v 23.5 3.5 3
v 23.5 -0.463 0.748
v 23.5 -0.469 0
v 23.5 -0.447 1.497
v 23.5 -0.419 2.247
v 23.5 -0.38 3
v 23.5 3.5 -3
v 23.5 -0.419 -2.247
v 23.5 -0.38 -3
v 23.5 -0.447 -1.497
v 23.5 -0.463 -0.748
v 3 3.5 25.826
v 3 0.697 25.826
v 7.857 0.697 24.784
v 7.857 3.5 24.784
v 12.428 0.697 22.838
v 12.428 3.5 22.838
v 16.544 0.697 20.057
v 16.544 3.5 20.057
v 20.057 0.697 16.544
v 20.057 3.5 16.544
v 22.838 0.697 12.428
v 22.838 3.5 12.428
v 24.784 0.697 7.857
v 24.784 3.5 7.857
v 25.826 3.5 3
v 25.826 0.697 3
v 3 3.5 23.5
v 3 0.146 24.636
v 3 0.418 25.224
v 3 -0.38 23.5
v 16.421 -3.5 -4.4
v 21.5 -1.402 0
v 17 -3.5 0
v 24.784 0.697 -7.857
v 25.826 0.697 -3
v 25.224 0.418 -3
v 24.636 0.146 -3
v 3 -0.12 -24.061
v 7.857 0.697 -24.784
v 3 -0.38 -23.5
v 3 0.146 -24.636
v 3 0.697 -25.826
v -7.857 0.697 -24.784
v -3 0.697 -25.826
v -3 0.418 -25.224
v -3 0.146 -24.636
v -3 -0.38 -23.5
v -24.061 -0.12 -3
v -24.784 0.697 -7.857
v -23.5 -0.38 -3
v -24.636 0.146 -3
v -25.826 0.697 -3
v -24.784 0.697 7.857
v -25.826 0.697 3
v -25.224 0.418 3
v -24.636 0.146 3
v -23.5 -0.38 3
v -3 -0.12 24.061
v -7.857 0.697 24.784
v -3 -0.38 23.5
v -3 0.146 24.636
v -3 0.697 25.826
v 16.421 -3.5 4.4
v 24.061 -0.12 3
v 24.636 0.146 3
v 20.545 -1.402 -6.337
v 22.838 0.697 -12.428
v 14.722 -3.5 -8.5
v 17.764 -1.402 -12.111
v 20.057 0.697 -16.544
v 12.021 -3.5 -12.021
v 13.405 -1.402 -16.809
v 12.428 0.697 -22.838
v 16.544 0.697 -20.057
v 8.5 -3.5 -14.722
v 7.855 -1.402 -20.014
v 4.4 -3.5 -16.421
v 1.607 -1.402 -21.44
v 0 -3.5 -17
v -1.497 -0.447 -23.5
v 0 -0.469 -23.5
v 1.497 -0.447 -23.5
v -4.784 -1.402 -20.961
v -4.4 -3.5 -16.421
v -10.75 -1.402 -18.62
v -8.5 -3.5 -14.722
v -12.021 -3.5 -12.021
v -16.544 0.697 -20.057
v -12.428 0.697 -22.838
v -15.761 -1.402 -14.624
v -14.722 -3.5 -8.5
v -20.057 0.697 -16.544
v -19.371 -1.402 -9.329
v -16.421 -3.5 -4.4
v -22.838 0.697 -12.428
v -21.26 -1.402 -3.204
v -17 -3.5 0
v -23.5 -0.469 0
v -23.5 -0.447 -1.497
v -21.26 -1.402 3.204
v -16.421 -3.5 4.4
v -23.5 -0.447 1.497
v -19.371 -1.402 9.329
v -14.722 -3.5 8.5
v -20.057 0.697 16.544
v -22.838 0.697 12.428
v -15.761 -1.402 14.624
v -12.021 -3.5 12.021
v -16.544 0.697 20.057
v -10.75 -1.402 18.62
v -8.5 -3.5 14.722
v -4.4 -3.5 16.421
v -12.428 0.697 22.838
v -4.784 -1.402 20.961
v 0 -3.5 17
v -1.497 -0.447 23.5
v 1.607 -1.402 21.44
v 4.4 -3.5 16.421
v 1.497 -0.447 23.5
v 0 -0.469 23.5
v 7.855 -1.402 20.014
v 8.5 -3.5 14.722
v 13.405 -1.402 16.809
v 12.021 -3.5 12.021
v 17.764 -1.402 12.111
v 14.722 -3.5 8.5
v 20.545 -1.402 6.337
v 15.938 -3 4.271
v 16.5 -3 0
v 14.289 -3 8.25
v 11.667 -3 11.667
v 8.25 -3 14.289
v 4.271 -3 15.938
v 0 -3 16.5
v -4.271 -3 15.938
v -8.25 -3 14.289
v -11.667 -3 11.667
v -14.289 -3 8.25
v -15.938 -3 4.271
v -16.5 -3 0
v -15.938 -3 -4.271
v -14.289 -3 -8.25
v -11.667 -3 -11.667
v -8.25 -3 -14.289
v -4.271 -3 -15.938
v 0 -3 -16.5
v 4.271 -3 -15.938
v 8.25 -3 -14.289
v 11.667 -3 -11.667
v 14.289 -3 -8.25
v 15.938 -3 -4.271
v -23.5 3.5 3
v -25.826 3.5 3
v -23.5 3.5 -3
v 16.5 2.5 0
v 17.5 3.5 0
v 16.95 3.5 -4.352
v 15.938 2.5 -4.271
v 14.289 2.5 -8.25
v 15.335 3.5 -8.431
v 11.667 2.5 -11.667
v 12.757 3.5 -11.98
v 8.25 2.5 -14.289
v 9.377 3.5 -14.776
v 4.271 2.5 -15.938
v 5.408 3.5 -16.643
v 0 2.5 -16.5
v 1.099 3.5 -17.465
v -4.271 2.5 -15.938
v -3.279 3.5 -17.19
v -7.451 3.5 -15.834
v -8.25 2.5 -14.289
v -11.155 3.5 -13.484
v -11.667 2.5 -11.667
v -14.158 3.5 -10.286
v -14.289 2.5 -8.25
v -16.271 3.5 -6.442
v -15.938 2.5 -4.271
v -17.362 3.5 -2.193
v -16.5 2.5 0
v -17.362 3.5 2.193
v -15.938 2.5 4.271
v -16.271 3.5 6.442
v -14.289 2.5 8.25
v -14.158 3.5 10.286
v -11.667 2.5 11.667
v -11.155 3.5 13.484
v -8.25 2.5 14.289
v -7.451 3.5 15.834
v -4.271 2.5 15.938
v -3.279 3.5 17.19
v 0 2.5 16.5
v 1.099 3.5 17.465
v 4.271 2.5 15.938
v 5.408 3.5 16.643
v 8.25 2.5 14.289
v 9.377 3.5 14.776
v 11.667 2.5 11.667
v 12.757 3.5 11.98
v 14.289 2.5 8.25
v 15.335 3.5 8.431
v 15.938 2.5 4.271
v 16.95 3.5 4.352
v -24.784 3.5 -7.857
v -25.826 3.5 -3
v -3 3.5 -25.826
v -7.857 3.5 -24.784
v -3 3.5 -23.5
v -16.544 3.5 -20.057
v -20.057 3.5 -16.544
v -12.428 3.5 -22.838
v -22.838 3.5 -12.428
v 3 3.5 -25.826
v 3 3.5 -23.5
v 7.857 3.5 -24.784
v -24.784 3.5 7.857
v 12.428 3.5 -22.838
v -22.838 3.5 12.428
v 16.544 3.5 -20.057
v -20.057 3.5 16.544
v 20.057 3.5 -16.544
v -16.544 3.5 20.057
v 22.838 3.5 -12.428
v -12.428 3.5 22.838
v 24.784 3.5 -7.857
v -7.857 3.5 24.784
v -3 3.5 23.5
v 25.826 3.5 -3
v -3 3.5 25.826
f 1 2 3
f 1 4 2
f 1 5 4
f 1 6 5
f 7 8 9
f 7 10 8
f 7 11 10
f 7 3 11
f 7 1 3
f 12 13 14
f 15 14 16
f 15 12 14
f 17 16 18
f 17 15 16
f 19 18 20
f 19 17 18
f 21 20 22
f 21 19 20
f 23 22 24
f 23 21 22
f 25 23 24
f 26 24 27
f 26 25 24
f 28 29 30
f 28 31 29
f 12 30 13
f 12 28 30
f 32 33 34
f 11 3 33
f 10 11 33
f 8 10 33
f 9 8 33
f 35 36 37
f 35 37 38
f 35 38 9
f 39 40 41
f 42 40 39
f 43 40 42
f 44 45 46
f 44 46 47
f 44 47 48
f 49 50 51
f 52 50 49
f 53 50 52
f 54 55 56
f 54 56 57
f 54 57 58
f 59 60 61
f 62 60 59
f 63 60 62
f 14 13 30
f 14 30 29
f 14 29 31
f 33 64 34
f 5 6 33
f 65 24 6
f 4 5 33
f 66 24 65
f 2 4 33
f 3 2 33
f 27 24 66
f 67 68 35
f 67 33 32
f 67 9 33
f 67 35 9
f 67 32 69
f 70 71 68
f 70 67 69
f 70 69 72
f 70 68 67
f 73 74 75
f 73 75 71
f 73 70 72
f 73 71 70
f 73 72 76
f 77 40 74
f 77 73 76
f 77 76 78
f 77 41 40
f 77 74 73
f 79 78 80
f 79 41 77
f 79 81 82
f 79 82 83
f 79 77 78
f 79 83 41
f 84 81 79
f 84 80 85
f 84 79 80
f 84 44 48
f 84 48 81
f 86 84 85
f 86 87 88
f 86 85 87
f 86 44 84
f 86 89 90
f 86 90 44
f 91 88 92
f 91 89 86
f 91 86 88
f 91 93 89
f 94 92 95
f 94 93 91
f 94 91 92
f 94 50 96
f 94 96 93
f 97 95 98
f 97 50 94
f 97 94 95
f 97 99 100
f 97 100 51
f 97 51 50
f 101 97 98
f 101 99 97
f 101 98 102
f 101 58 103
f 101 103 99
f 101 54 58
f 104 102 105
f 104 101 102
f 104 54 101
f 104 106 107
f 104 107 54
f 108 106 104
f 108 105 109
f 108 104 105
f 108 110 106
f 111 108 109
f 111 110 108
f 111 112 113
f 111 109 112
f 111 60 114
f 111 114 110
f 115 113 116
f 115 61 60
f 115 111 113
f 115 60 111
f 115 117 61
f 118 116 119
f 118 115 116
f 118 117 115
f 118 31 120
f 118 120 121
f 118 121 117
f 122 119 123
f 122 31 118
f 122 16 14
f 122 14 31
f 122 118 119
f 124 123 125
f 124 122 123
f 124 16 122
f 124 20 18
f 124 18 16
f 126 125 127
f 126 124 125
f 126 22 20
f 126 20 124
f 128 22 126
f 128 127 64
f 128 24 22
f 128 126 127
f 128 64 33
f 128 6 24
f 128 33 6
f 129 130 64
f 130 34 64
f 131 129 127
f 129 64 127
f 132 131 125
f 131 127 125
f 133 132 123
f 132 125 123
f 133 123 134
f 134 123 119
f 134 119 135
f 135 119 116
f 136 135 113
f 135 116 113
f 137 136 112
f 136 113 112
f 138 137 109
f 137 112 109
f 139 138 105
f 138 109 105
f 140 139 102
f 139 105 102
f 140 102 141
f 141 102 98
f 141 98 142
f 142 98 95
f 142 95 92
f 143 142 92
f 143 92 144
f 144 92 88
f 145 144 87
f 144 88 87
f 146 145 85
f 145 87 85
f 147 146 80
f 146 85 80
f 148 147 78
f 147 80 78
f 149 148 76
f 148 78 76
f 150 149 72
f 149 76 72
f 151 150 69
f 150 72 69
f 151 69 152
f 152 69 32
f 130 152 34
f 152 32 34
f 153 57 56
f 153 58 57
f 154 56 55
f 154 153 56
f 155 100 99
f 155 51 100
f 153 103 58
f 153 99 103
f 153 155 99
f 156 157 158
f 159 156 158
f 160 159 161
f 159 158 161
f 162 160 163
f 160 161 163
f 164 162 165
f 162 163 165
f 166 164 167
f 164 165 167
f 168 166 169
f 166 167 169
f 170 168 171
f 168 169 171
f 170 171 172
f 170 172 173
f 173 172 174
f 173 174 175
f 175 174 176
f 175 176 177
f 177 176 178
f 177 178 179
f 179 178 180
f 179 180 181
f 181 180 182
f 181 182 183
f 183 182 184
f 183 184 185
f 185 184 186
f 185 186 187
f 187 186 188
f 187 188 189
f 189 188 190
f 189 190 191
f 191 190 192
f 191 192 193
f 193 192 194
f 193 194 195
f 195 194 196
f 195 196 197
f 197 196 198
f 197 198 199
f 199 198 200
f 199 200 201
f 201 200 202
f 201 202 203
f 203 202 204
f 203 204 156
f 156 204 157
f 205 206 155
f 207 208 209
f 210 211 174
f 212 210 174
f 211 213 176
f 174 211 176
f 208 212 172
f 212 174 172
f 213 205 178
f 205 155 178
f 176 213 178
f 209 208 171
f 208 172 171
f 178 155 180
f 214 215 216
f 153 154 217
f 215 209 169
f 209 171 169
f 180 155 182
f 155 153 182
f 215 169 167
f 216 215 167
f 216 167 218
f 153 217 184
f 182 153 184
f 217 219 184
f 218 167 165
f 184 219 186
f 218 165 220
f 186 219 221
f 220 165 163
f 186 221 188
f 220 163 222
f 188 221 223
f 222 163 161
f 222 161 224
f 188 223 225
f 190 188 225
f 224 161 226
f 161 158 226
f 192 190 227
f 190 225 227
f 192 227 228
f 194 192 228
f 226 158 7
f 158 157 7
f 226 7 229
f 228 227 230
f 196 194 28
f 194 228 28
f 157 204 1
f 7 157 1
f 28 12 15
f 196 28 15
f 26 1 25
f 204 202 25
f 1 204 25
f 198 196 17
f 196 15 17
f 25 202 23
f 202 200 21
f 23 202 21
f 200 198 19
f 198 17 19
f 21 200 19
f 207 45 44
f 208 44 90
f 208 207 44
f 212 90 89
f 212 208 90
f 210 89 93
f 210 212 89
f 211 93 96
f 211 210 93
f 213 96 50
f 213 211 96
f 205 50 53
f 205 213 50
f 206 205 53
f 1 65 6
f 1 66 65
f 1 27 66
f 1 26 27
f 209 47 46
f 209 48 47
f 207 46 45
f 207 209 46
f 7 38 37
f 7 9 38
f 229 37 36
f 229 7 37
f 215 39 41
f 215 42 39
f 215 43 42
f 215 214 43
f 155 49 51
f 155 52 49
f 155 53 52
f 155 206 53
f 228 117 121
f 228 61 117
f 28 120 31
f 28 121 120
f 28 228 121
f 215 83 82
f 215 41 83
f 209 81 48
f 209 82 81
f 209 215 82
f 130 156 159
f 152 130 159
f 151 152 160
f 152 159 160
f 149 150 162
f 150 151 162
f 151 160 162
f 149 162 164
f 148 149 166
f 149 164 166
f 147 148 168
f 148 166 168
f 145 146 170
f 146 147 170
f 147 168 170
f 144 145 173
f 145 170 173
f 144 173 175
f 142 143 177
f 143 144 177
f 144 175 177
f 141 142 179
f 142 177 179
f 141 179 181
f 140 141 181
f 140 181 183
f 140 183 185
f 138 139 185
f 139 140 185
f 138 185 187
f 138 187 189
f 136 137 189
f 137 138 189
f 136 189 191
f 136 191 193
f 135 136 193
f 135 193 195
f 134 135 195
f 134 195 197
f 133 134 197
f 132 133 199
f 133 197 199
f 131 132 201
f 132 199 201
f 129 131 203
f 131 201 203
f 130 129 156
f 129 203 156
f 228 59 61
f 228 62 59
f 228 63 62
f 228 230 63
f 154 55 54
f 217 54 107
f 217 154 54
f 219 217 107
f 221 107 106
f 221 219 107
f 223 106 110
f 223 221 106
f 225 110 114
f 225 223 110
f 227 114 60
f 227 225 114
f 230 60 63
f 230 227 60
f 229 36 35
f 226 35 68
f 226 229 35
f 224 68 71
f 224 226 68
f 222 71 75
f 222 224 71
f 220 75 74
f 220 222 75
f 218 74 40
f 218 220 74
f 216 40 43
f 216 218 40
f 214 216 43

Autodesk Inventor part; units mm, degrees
ref_plane "YZ Plane" through (0, 0, 0) normal (1, 0, 0) x (0, 1, 0)
ref_plane "XZ Plane" through (0, 0, 0) normal (0, 1, 0) x (-1, 0, 0)
ref_plane "XY Plane" through (0, 0, 0) normal (0, 0, 1) x (1, 0, 0)
sketch "Эскиз1" plane through (0, 0, 0) normal (0, 0, 1) x (1, 0, 0)
  line L0 (0, 3.5) -> (0, -3.5)
  line L1 (17, -3.5) -> (26, 0.6968)
  line L2 (26, 0.6968) -> (26, 3.5)
  line L3 (26, 3.5) -> (17.5, 3.5)
  line L4 (17, -3.5) -> (16.5, -3)
  line L5 (16.5, -3) -> (16.5, 2.5)
  line L6 (0, -3.5) -> (17, -3.5) construction
  line L7 (16.5, 2.5) -> (17.5, 3.5)
  point P0 (0, 0)
  point P1 (0, 0)
  point P2 (16.5, 3.5)
  dimension "d0" = 7
  dimension "d1" = 34
  dimension "d2" = 33
  dimension "d3" = 25
  dimension "d4" = 52
  dimension "d5" = 45
  dimension "d6" = 1
  dimension "d7" = 45
revolve "Вращение1" add sketch "Эскиз1" angle 360 about axis through (0, 3.5, 0) along (0, -1, 0)
sketch "Эскиз2" plane through (0, 3.5, 0) normal (0, 1, 0) x (1, 0, 0)
  line L0 (-3, 26) -> (3, 26)
  line L1 (3, 26) -> (3, 23.5)
  line L2 (3, 23.5) -> (-3, 23.5)
  line L3 (-3, 23.5) -> (-3, 26)
  circle A0 centre (0, 0) radius 26 projected
  point P0 (0, 0)
  point P1 (0, 23.5)
  point P2 (3, 25.8263)
  point P3 (-3, 25.8263)
  dimension "d9" = 6
  dimension "d10" = 2.5
extrude "Выдавливание1" cut sketch "Эскиз2" against normal through all contours A0 L1 L2 L3 picked at (0, 24.3333)
pattern_circular "Круговой массив1" count 4 over 360 about axis through (0, 2.0984, 0) along (0, -1, 0) of "Выдавливание1"
thread "Резьба1" size "M33x1" class "6H" standard "ISO Metric profile" length 20
properties part number "75. Гайка промежуточного вала"
